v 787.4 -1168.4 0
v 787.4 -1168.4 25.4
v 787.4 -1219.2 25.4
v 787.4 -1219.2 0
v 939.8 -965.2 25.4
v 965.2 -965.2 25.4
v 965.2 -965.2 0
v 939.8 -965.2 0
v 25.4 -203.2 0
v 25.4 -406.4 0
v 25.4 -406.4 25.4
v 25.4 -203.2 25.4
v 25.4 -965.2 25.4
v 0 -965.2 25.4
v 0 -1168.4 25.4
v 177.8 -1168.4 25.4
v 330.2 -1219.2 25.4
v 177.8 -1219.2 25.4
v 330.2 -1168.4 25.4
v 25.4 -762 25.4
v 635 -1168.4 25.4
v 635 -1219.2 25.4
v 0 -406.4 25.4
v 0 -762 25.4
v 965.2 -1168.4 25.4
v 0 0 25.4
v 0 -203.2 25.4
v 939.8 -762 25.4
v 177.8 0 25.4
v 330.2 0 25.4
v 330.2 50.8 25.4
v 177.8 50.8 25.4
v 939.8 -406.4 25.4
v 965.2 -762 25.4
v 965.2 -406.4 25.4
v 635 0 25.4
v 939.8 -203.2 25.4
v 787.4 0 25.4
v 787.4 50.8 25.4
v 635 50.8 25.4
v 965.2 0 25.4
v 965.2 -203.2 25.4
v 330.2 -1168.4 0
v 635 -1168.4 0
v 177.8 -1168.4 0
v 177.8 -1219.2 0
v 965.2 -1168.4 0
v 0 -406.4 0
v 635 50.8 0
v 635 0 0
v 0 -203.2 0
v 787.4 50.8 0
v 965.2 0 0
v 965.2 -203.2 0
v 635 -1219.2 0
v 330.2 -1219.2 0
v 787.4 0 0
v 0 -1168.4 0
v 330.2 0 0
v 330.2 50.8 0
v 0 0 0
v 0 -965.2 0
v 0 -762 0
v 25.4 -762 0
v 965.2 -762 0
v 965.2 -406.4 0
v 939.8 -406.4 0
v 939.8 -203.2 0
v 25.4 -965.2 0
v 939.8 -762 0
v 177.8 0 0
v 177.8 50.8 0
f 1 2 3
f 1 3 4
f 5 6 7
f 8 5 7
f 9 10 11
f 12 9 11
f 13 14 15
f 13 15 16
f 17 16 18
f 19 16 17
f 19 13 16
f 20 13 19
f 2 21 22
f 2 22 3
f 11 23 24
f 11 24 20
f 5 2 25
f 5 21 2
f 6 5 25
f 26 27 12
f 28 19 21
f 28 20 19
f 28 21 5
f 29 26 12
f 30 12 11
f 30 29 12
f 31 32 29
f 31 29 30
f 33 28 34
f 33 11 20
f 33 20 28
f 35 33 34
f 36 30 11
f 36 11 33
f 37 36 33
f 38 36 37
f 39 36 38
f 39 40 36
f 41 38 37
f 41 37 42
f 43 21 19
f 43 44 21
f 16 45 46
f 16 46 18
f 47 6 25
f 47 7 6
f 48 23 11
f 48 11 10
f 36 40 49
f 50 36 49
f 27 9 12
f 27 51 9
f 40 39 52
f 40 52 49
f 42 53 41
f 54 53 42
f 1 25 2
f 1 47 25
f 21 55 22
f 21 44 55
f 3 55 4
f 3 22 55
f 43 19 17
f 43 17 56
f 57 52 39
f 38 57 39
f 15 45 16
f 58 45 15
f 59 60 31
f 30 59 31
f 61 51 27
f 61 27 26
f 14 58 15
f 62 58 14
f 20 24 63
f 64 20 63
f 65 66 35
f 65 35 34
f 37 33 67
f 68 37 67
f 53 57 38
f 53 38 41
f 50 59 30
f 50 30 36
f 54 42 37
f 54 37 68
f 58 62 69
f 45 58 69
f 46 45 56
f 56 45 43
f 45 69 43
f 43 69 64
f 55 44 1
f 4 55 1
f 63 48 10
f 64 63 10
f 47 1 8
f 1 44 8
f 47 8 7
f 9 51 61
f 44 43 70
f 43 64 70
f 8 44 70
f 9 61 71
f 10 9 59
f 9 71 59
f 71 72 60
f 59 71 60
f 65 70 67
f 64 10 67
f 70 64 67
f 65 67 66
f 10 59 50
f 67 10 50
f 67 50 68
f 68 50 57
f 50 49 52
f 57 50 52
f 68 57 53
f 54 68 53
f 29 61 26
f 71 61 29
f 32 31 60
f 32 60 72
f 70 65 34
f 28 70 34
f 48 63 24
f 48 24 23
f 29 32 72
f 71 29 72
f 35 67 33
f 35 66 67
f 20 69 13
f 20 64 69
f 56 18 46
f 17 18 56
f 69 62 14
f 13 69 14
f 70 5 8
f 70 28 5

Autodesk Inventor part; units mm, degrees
ref_plane "YZ Plane" through (0, 0, 0) normal (1, 0, 0) x (0, 1, 0)
sketch "Sketch1" plane through (0, 0, 0) normal (0, 0, 1) x (1, 0, 0)
  line L0 (0, 0) -> (965.2, 0)
  line L1 (965.2, 0) -> (965.2, -1168.4)
  line L2 (965.2, -1168.4) -> (0, -1168.4)
  line L3 (0, -1168.4) -> (0, 0)
  dimension "d0" = 965.2
  dimension "d1" = 1168.4
extrude "Extrusion1" add sketch "Sketch1" along normal blind 25.4
sketch "Sketch2" plane through (0, -1168.4, 0) normal (0, -1, 0) x (1, 0, 0)
  line L0 (965.2, 25.4) -> (0, 25.4) projected
  line L1 (0, 0) -> (965.2, 0) projected
  line L2 (177.8, 25.4) -> (330.2, 25.4)
  line L3 (330.2, 25.4) -> (330.2, 0)
  line L4 (330.2, 0) -> (177.8, 0)
  line L5 (177.8, 0) -> (177.8, 25.4)
  line L6 (177.8, 12.7) -> (330.2, 12.7)
  line L7 (635, 25.4) -> (787.4, 25.4)
  line L8 (787.4, 25.4) -> (787.4, 0)
  line L9 (787.4, 0) -> (635, 0)
  line L10 (635, 0) -> (635, 25.4)
  line L11 (635, 12.7) -> (787.4, 12.7)
  line L12 (787.4, 12.7) -> (965.2, 12.7)
  line L13 (965.2, 0) -> (965.2, 25.4) projected
  line L14 (965.2, 0) -> (0, 0) projected
  line L15 (965.2, 0) -> (965.2, 25.4) projected
  line L16 (0, 25.4) -> (965.2, 25.4) projected
  line L17 (0, 0) -> (0, 25.4) projected
  line L18 (177.8, 12.7) -> (0, 12.7)
  line L19 (0, 0) -> (0, 25.4) projected
  dimension "d4" = 152.4
  dimension "d5" = 177.8
extrude "Extrusion2" add sketch "Sketch2" along normal blind 50.8 contours L8 L11 L10 L0 | L8 L1 L10 L11 | L3 L6 L5 L0 | L3 L1 L5 L6
sketch "Sketch3" plane through (0, -1168.4, 0) normal (-1, 0, 0) x (0, 0, 1)
  line L0 (0, 0) -> (0, 1168.4) projected
  line L1 (0, 0) -> (25.4, 0) projected
  line L2 (25.4, 1168.4) -> (25.4, 0) projected
  line L3 (0, 1168.4) -> (25.4, 1168.4) projected
  line L4 (25.4, 1168.4) -> (25.4, 0) projected
  line L5 (0, 203.2) -> (25.4, 203.2)
  line L6 (25.4, 203.2) -> (25.4, 406.4)
  line L7 (25.4, 406.4) -> (0, 406.4)
  line L8 (0, 406.4) -> (0, 203.2)
  line L9 (0, 0) -> (0, 1168.4) projected
  line L10 (0, 965.2) -> (25.4, 965.2)
  line L11 (25.4, 965.2) -> (25.4, 762)
  line L12 (25.4, 762) -> (0, 762)
  line L13 (0, 762) -> (0, 965.2)
  dimension "d8" = 203.2
  dimension "d9" = 203.2
  dimension "d12" = 355.6
  dimension "d13" = 203.2
extrude "Extrusion3" cut sketch "Sketch3" against normal blind 25.4 contours L0 L7 L2 L5 | L0 L10 L2 L12
ref_plane "Work Plane1" through (482.6, 0, 0) normal (-1, 0, 0) x (0, 0, 1)
mirror "Mirror1" about plane through (482.6, 0, 0) normal (-1, 0, 0) of "Extrusion3"
ref_plane "Work Plane2" through (330.2, -584.2, 0) normal (0, -1, 0) x (1, 0, 0)
mirror "Mirror2" about plane through (330.2, -584.2, 0) normal (0, -1, 0) of "Extrusion2"
properties part number "rev1 small wall"
